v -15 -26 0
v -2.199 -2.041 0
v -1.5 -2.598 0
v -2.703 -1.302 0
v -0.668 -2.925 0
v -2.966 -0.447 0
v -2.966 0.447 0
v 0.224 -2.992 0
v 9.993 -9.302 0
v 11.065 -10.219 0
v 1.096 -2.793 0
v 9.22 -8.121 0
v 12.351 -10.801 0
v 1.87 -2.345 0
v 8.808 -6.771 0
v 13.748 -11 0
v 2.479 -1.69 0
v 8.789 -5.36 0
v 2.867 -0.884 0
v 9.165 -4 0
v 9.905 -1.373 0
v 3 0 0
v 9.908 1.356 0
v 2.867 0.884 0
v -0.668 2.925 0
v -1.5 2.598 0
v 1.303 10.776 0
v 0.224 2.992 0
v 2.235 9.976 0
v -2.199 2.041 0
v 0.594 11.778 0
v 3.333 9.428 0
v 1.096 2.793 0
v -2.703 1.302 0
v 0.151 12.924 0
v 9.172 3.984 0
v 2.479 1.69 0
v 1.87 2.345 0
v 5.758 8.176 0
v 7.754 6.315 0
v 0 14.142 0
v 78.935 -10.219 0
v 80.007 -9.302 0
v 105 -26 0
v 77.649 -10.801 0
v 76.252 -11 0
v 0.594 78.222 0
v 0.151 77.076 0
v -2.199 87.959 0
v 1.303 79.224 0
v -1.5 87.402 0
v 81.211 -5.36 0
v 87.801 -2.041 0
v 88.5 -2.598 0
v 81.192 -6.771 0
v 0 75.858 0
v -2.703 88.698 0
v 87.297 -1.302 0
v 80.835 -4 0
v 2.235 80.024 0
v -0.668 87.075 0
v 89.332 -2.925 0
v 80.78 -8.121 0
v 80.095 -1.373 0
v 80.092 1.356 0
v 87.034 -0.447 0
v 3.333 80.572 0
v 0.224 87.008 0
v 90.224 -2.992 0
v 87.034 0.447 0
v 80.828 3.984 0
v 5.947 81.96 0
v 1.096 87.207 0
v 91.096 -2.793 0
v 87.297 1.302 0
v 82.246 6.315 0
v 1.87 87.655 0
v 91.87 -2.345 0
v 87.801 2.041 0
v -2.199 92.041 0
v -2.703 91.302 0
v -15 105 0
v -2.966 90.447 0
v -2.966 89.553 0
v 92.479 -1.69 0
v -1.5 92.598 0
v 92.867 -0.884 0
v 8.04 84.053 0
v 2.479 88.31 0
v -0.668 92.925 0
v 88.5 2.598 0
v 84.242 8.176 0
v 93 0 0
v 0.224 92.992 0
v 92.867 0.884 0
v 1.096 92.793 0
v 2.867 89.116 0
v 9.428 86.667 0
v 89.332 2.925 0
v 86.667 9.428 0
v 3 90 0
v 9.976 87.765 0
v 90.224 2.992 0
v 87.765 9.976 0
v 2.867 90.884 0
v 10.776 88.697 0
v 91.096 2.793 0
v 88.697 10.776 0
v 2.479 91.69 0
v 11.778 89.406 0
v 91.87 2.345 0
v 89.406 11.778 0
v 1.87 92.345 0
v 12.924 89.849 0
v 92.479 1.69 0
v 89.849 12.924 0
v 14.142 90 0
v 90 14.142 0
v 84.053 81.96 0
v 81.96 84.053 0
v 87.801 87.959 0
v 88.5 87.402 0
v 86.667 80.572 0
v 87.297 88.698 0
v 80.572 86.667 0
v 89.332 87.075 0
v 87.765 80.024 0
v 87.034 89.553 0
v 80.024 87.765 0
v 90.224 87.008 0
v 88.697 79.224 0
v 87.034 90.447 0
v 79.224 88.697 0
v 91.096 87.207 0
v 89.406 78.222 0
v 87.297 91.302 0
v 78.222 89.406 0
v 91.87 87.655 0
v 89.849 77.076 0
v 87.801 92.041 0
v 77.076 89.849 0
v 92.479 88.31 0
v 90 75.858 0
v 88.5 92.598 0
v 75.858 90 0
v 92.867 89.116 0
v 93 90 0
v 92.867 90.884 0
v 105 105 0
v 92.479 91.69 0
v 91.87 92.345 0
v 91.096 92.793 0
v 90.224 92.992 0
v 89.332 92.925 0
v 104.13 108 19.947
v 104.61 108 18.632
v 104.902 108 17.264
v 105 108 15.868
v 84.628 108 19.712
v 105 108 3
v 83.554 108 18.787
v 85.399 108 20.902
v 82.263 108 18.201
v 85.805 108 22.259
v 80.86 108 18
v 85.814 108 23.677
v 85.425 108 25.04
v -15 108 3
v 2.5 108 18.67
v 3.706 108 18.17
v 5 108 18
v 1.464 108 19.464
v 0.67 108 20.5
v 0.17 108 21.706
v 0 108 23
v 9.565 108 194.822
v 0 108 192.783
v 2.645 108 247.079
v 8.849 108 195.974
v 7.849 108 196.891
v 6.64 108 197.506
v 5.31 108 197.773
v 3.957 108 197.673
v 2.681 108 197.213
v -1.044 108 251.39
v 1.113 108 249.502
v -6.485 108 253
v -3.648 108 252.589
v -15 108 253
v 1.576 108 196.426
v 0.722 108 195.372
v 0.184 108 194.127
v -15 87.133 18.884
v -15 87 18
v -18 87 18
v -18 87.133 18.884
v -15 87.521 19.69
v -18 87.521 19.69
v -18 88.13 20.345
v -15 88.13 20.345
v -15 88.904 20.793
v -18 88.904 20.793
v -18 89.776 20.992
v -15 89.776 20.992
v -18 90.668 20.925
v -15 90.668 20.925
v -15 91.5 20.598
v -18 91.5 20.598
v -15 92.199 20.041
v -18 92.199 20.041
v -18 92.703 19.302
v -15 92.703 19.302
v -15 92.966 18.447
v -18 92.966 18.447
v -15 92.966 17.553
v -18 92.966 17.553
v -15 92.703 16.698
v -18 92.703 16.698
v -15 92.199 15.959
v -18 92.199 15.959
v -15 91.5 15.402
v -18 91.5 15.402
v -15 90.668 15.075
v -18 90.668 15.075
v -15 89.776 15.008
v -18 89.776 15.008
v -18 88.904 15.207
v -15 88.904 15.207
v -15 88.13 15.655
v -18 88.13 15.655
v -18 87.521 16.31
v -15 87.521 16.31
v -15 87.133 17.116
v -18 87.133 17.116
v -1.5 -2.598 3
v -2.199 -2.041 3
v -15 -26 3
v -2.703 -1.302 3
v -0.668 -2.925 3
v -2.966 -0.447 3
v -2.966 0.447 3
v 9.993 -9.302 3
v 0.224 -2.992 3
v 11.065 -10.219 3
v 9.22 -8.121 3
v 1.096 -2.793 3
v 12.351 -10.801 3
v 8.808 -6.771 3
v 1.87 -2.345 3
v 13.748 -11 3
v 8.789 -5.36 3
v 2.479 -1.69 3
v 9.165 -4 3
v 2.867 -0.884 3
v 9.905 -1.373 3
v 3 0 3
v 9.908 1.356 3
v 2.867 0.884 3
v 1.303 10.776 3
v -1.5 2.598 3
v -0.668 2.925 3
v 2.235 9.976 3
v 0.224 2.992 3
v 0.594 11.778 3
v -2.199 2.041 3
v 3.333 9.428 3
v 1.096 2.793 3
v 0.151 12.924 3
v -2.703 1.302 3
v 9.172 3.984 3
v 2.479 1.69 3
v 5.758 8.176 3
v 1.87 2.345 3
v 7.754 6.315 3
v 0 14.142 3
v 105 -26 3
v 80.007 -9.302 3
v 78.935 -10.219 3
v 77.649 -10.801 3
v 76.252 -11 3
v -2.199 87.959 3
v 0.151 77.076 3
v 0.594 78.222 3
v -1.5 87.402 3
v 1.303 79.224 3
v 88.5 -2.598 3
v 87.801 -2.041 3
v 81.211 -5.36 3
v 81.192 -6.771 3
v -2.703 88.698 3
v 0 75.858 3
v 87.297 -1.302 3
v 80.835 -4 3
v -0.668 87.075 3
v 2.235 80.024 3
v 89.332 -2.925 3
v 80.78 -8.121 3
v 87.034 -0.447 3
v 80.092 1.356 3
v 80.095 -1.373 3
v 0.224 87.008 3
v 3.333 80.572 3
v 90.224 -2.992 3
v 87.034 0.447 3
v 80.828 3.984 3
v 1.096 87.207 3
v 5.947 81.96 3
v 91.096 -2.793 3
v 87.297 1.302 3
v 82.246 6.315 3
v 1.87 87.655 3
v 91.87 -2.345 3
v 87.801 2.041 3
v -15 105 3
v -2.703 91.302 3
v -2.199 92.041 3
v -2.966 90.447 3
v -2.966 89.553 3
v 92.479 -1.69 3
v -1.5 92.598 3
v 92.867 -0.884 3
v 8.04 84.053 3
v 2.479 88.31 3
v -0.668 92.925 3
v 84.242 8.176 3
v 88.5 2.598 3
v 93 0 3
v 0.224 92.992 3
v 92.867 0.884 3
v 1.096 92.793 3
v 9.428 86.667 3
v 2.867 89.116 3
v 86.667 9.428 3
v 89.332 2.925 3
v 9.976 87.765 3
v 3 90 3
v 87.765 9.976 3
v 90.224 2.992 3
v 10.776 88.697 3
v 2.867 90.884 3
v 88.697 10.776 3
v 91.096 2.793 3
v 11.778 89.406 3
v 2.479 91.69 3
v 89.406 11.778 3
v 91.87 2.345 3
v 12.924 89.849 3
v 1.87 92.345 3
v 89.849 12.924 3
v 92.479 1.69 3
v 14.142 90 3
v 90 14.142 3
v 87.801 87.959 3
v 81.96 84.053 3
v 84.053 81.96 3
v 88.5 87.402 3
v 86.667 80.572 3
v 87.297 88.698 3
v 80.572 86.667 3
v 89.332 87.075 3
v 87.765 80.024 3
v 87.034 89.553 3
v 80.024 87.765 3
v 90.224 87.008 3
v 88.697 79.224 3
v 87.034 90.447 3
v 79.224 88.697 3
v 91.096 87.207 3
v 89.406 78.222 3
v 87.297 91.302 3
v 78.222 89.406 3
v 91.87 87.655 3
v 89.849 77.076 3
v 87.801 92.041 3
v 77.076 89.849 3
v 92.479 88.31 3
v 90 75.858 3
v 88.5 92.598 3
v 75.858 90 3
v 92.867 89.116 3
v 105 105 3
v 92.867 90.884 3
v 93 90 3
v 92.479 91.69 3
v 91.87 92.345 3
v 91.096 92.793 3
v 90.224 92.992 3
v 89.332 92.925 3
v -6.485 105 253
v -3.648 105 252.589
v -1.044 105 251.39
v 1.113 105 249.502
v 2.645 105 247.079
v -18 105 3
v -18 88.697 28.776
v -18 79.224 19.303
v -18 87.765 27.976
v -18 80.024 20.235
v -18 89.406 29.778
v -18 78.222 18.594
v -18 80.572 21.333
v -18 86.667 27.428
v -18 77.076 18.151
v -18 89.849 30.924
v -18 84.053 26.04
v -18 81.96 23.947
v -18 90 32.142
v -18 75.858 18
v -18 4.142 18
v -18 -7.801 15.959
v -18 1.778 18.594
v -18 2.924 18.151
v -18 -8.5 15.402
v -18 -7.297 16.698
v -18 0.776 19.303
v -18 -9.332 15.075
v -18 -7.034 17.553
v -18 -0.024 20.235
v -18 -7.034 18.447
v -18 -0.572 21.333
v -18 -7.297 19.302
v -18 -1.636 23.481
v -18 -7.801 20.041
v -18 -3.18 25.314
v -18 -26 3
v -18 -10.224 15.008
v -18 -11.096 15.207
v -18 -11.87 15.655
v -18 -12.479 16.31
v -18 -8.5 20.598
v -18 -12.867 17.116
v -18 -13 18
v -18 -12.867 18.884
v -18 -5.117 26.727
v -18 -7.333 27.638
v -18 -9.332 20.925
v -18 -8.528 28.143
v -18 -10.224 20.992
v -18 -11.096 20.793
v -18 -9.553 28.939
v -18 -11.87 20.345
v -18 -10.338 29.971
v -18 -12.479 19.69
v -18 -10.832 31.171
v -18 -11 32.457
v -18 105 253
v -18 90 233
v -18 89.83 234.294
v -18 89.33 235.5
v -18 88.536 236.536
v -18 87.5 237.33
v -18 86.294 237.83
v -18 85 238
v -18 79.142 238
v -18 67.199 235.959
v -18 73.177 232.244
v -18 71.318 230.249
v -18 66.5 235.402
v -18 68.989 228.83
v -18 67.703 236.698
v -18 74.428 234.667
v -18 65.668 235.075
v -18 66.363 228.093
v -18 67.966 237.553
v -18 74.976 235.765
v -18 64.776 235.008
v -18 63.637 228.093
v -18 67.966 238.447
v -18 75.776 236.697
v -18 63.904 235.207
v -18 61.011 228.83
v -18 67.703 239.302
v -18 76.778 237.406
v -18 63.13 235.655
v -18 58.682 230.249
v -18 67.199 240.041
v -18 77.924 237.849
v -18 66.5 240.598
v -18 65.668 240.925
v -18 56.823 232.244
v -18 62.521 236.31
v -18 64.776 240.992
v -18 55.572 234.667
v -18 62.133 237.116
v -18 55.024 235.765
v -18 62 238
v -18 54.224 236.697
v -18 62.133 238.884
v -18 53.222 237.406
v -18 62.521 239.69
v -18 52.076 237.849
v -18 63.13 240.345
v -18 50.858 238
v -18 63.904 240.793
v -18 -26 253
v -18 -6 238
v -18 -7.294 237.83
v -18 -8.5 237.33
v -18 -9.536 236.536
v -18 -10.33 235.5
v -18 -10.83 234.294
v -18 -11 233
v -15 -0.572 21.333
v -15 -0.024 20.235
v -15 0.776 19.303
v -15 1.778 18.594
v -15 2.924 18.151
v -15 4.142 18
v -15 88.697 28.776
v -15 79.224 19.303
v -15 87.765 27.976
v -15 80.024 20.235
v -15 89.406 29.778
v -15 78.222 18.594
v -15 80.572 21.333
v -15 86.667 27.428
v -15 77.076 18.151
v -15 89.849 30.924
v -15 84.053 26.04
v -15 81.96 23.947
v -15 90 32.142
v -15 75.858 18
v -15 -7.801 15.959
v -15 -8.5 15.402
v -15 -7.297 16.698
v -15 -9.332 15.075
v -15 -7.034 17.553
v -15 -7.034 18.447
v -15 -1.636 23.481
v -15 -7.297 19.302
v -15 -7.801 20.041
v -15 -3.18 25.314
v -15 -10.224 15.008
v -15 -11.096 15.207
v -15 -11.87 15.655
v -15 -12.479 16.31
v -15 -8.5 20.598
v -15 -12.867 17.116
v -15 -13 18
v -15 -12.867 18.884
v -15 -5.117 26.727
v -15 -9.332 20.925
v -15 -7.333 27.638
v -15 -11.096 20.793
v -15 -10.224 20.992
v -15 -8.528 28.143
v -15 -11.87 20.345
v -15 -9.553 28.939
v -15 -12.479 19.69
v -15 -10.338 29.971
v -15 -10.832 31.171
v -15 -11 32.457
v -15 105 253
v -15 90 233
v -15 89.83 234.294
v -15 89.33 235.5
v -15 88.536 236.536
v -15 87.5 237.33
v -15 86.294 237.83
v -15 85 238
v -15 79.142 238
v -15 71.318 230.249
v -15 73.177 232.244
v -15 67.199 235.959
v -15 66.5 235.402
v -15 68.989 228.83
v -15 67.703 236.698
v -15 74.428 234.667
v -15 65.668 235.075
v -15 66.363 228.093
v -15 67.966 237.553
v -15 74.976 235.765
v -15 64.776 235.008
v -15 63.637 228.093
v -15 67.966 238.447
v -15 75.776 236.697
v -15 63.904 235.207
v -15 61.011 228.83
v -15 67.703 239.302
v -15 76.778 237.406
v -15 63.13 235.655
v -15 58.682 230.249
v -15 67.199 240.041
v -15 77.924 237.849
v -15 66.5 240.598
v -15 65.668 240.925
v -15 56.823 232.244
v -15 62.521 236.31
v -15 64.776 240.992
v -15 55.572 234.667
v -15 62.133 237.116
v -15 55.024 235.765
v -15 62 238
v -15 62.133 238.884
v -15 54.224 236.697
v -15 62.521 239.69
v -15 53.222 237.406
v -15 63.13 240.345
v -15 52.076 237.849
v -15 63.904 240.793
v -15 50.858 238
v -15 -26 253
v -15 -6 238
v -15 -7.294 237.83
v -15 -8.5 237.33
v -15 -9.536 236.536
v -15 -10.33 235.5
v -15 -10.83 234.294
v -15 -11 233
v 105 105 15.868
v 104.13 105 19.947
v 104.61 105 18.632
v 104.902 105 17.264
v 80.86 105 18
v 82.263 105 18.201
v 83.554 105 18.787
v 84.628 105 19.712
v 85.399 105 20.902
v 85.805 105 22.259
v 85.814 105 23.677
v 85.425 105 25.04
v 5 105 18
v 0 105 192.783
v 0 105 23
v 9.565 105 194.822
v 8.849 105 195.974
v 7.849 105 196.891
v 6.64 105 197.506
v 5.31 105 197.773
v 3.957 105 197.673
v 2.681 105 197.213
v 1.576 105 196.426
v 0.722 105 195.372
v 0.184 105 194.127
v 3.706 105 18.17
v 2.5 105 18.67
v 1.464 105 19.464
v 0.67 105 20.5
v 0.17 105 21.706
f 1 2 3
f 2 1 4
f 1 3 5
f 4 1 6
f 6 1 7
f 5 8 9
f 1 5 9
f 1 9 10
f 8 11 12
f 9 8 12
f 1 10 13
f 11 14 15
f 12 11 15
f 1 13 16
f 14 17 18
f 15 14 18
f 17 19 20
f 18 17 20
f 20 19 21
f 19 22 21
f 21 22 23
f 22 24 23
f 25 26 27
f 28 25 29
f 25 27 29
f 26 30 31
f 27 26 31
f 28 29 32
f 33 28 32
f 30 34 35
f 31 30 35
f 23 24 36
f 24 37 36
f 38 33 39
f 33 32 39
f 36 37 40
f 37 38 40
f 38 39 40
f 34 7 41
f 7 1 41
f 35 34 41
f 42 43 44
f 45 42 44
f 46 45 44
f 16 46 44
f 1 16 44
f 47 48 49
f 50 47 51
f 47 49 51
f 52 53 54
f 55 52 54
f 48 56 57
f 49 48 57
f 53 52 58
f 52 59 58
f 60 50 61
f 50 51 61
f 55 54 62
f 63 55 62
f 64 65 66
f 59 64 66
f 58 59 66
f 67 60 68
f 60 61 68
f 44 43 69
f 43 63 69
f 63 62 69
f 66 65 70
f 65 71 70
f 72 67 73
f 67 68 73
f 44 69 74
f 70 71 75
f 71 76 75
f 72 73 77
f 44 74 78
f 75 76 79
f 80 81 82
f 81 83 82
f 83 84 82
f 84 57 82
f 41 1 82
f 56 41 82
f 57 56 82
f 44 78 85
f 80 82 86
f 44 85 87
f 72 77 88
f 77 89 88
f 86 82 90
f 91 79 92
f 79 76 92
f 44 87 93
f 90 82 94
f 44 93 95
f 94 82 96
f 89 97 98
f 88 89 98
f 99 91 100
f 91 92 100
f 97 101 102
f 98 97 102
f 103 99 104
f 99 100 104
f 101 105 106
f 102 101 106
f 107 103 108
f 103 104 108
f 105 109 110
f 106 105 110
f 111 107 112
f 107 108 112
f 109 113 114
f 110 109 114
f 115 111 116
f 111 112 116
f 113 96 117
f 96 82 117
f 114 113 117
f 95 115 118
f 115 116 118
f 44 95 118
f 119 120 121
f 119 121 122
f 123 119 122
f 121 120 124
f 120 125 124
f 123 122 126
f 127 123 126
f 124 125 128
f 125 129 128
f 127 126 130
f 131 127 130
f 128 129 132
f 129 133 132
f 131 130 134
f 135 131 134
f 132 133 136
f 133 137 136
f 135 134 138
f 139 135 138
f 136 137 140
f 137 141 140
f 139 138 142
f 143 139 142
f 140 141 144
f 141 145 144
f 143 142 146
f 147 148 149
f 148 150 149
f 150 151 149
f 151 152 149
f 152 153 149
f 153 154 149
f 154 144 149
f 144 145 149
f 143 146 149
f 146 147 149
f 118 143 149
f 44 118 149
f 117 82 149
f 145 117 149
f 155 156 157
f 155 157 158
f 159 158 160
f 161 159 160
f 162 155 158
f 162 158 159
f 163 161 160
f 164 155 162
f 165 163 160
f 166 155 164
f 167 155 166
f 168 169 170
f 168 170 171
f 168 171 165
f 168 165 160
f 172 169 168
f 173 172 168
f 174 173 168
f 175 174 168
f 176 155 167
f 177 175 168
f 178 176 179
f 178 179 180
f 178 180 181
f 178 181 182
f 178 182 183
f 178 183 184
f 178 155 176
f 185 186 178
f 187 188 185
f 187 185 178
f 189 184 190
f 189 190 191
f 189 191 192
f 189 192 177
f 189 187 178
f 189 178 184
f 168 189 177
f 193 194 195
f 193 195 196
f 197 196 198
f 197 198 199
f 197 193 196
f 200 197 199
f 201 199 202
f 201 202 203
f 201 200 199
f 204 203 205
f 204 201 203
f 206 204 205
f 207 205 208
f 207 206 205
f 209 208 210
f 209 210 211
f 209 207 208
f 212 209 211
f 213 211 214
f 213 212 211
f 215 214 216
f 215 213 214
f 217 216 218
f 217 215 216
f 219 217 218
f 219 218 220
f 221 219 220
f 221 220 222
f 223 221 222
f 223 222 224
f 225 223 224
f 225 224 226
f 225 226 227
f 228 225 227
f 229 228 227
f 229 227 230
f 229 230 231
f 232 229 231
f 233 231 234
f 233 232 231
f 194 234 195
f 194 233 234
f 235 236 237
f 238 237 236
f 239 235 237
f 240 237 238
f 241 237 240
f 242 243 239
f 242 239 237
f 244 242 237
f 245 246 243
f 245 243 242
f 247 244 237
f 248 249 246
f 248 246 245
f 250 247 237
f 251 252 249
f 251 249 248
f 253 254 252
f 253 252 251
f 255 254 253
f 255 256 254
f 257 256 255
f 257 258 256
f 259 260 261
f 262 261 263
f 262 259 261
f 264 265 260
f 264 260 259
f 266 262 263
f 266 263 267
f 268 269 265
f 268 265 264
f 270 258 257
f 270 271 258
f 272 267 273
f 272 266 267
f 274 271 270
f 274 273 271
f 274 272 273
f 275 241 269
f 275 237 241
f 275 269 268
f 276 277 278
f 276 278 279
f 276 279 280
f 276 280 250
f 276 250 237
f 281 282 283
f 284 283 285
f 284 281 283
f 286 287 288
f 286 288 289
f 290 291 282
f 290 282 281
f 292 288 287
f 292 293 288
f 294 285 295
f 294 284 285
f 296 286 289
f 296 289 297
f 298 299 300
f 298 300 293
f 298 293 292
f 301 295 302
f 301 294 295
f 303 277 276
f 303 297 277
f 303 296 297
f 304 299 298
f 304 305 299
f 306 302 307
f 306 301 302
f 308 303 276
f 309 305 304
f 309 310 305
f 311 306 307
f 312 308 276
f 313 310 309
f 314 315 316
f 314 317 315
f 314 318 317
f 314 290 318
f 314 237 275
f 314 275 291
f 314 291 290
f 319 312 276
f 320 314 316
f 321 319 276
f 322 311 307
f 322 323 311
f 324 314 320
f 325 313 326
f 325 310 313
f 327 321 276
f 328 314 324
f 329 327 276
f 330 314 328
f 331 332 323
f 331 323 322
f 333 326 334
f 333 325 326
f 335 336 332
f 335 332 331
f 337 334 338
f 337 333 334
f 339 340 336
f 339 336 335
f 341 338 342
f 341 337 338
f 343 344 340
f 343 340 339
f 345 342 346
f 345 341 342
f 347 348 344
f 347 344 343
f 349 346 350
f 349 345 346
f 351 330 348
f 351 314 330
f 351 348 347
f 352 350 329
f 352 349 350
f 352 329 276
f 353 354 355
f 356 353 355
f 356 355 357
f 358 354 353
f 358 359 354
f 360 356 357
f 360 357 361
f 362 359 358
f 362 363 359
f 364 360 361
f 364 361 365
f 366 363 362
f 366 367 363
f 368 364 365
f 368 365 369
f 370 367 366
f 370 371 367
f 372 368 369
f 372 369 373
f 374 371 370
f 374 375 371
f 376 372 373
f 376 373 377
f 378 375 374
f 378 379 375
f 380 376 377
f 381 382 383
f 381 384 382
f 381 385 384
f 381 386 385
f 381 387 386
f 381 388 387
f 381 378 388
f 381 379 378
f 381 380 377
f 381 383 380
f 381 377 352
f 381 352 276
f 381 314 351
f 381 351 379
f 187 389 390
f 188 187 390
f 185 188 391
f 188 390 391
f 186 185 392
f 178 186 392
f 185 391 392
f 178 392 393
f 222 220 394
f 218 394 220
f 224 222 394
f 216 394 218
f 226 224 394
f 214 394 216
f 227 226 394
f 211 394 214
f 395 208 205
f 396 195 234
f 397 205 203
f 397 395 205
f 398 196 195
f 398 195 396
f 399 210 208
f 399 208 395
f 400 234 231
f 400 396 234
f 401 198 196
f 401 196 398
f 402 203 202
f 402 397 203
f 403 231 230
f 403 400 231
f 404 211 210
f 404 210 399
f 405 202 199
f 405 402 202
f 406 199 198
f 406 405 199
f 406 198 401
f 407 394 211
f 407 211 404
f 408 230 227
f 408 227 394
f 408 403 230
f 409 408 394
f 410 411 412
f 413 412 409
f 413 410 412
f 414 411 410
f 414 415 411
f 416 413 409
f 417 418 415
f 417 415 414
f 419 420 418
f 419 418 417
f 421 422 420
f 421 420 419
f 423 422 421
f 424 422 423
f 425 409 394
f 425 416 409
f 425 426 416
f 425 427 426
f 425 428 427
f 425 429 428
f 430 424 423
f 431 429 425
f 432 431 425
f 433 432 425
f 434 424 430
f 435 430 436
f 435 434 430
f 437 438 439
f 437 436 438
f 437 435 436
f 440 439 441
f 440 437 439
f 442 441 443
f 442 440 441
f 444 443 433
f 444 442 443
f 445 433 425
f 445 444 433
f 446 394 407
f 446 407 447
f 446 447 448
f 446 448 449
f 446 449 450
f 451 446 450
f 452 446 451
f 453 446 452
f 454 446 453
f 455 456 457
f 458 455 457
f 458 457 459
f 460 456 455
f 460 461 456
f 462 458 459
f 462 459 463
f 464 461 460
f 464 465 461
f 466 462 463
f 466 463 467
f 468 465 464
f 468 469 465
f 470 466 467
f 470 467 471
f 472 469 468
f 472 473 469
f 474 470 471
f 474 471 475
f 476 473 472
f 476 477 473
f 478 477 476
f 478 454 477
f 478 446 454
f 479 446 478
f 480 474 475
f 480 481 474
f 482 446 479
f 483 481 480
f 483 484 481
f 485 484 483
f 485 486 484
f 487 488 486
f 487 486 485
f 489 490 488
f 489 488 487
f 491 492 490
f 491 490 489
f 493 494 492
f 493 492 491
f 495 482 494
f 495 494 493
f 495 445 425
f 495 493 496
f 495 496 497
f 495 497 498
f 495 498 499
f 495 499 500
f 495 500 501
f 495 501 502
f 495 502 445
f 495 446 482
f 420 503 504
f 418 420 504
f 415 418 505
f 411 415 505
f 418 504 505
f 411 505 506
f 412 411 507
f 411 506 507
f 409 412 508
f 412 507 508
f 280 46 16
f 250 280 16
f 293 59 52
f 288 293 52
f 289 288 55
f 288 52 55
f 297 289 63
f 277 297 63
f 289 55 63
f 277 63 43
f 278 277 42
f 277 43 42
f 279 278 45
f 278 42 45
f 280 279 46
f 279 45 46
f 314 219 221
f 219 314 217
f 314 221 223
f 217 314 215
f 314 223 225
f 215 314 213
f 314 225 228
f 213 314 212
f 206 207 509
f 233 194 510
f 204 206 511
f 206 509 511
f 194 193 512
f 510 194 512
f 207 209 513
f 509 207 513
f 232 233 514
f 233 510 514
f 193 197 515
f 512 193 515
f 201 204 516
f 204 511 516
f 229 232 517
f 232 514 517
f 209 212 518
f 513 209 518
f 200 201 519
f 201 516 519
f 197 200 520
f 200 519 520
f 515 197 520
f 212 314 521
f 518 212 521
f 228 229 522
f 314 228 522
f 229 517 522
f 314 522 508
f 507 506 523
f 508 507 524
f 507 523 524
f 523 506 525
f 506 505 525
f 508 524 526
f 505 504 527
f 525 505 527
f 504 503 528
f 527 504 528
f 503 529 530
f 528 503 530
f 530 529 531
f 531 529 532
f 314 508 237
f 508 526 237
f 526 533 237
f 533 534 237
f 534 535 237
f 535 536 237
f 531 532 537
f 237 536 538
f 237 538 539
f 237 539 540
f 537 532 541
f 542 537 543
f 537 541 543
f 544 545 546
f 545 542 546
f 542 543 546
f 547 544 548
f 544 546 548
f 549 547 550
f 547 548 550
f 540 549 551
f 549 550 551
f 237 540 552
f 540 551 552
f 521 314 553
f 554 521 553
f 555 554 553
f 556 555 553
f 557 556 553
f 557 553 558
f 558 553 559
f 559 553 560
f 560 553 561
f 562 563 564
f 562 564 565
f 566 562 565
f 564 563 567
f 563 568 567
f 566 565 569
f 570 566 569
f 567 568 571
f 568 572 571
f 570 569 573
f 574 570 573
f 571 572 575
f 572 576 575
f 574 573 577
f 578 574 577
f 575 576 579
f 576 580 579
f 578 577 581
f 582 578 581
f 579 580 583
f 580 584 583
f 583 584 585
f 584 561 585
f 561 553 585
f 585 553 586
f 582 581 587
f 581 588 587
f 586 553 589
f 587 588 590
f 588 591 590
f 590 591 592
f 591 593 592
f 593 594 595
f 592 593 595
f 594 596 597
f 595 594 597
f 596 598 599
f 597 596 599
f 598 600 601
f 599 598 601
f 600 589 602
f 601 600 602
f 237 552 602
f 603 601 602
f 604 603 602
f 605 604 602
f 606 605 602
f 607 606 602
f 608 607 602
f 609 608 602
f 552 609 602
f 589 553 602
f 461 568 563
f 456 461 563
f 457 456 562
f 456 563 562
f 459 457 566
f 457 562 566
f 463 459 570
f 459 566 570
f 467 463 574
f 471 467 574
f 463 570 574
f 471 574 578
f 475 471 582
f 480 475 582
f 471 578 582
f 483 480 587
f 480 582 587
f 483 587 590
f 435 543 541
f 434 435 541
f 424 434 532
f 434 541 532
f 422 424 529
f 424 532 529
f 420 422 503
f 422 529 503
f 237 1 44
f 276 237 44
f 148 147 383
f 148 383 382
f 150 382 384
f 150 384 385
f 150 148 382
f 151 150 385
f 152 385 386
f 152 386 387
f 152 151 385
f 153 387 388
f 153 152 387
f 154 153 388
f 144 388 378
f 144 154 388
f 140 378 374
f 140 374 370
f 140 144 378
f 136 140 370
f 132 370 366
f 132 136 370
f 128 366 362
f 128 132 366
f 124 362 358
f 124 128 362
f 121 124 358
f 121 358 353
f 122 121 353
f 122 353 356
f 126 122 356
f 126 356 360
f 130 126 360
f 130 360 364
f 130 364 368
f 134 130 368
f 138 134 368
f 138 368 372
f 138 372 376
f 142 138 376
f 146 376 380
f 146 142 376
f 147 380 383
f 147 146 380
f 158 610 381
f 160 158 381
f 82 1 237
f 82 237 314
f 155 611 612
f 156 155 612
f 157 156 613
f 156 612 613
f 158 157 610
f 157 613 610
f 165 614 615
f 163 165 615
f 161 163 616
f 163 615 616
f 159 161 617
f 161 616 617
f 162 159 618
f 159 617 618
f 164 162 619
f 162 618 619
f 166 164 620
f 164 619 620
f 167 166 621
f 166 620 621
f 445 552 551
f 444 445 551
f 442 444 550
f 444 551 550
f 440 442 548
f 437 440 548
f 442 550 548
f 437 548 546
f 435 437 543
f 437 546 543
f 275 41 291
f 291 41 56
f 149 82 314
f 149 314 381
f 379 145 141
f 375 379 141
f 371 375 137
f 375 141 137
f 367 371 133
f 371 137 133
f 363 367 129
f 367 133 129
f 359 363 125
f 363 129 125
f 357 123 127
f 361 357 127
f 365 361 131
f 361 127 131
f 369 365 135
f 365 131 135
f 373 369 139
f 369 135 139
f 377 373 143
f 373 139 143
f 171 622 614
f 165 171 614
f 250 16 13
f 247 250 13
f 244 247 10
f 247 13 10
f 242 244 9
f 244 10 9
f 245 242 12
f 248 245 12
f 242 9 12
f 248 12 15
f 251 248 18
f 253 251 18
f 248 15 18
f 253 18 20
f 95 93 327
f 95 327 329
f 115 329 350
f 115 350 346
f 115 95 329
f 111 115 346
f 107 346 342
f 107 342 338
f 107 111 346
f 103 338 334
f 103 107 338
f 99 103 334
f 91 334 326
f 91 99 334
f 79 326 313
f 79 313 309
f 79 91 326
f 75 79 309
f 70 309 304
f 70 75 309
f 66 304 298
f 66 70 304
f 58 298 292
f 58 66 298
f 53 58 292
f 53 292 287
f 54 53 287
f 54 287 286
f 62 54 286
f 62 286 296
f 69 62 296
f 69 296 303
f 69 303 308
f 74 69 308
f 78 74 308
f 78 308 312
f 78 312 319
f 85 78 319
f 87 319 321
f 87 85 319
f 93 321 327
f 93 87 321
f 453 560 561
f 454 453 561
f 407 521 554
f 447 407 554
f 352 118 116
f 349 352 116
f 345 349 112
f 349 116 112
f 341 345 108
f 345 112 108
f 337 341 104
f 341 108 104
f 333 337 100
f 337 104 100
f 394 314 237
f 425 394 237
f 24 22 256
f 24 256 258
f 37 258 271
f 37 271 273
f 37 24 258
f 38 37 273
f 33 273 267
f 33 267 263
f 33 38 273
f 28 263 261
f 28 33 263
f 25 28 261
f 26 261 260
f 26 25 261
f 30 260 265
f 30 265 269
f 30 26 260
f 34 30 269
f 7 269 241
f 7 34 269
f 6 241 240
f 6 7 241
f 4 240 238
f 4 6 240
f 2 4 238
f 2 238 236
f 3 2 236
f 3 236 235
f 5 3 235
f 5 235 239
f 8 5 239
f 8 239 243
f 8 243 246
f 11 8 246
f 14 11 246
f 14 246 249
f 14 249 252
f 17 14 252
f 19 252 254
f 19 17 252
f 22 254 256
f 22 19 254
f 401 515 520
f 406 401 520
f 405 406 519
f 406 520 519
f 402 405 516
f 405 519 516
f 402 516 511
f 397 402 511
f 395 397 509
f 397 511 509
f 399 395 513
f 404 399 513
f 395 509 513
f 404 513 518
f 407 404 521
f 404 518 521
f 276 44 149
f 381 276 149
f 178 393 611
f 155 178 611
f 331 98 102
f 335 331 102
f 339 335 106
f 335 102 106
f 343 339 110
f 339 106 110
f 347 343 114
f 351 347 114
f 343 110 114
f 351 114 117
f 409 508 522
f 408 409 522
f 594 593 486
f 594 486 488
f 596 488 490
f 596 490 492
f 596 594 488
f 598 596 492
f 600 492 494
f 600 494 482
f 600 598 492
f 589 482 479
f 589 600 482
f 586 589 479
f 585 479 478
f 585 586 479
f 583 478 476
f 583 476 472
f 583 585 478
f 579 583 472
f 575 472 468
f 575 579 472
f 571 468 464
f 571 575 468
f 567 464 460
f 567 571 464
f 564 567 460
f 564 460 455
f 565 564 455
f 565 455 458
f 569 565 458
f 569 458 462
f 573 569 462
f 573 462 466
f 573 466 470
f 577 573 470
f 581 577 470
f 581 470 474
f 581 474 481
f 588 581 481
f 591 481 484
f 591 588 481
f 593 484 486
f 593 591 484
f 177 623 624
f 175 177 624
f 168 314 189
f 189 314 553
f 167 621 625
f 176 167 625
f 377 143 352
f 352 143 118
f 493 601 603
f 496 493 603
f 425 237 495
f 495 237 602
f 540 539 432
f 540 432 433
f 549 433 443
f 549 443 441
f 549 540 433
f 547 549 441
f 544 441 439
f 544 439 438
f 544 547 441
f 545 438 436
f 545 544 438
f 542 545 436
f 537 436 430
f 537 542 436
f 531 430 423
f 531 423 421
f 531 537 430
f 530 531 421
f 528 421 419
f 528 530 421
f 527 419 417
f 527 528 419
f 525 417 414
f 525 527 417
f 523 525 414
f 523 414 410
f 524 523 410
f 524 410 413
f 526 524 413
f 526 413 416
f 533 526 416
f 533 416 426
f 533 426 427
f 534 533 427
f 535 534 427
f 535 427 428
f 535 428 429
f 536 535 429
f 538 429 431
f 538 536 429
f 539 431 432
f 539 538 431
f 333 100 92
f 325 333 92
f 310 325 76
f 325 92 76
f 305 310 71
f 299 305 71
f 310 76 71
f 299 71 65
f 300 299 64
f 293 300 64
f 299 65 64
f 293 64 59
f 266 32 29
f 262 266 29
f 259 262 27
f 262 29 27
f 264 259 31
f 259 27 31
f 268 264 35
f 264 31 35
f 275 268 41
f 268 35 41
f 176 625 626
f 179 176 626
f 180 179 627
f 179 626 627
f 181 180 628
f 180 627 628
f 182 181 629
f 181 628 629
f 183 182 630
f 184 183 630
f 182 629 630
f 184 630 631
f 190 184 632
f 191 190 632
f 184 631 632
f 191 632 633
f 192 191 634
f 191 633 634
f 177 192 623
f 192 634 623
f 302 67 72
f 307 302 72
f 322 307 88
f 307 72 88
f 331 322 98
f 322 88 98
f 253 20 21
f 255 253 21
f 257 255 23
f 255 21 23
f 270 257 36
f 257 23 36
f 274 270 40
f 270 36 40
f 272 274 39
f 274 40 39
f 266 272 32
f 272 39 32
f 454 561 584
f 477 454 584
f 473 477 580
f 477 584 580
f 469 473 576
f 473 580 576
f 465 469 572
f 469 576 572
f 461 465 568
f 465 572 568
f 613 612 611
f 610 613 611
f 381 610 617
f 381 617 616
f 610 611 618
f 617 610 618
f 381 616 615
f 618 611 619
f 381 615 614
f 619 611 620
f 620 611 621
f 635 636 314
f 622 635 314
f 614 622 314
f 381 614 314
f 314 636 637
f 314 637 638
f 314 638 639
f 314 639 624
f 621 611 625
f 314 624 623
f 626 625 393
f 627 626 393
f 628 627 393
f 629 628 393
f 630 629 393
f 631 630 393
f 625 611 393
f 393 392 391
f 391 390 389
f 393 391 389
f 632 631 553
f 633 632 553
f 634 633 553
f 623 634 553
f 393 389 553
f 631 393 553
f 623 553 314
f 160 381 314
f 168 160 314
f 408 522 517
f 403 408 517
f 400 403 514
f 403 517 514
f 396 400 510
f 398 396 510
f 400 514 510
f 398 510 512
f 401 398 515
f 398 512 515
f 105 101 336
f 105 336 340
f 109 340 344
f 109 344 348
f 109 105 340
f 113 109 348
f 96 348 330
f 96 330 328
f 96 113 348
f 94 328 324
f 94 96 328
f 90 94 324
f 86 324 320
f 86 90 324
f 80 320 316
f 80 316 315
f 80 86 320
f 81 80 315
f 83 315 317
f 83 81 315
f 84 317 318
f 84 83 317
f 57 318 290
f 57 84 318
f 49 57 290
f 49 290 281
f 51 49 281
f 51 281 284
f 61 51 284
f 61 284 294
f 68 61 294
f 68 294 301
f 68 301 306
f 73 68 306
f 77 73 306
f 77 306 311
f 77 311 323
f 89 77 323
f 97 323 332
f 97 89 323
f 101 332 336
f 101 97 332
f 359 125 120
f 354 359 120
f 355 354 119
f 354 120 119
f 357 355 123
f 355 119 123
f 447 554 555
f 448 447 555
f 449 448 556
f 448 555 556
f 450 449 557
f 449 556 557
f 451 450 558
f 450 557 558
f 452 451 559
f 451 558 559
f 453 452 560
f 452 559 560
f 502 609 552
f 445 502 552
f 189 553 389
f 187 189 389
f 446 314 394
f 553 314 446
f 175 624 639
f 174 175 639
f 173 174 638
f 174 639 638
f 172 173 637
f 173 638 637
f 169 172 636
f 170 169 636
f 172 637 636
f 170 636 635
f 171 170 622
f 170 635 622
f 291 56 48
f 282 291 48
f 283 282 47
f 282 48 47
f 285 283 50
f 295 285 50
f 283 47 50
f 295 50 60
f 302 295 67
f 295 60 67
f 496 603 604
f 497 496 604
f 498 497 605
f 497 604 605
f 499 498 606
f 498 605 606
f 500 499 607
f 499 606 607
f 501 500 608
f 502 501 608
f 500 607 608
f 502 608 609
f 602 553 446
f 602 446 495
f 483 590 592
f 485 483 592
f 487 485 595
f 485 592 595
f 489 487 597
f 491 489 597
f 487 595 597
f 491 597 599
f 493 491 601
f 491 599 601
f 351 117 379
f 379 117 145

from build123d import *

# Parameters (mm, degrees)
F0_W     = 120
F0_H     = 131
F0_R     = 3
F1_DEPTH = 3
F2_W     = 131
F2_H     = 250
F2_R     = 3
F3_DEPTH = 3
F5_DEPTH = 3


with BuildPart() as f1:
    # F0 (on Top) → F1 (new body)
    with BuildSketch(Plane.XY):
        with Locations((45, 39.5)):
            Rectangle(F0_W, F0_H)
        Circle(F0_R, mode=Mode.SUBTRACT)
        with Locations((90, 0)):
            Circle(F0_R, mode=Mode.SUBTRACT)
        with BuildLine():
            ThreePointArc((0, 75.857864), (0.917517, 78.744616), (3.333333, 80.57191))
            ThreePointArc((3.333333, 80.57191), (7.071068, 82.928932), (9.42809, 86.666667))
            ThreePointArc((9.42809, 86.666667), (11.255384, 89.082483), (14.142136, 90))
            Line((14.142136, 90), (75.857864, 90))
            ThreePointArc((75.857864, 90), (78.744616, 89.082483), (80.57191, 86.666667))
            ThreePointArc((80.57191, 86.666667), (82.928932, 82.928932), (86.666667, 80.57191))
            ThreePointArc((86.666667, 80.57191), (89.082483, 78.744616), (90, 75.857864))
            Line((90, 75.857864), (90, 14.142136))
            ThreePointArc((90, 14.142136), (89.082483, 11.255384), (86.666667, 9.42809))
            ThreePointArc((86.666667, 9.42809), (80.827681, 3.983537), (80.834849, -4))
            ThreePointArc((80.834849, -4), (80.435573, -8.738613), (76.252273, -11))
            Line((76.252273, -11), (13.747727, -11))
            ThreePointArc((13.747727, -11), (9.564427, -8.738613), (9.165151, -4))
            ThreePointArc((9.165151, -4), (9.172319, 3.983537), (3.333333, 9.42809))
            ThreePointArc((3.333333, 9.42809), (0.917517, 11.255384), (0, 14.142136))
            Line((0, 14.142136), (0, 75.857864))
        make_face(mode=Mode.SUBTRACT)
        with Locations((0, 90)):
            Circle(F0_R, mode=Mode.SUBTRACT)
        with Locations((90, 90)):
            Circle(F0_R, mode=Mode.SUBTRACT)
    extrude(amount=F1_DEPTH)


with BuildPart() as f3:
    # F2 (on face) → F3 (new body)
    with BuildSketch(Plane(origin=(-15, 0, 0), x_dir=(0, -1, 0), z_dir=(-1, 0, 0))):
        with Locations((-39.5, 128)):
            Rectangle(F2_W, F2_H)
        with Locations((-90, 18)):
            Circle(F2_R, mode=Mode.SUBTRACT)
        with Locations((10, 18)):
            Circle(F2_R, mode=Mode.SUBTRACT)
        with Locations((-65, 238)):
            Circle(F2_R, mode=Mode.SUBTRACT)
        with BuildLine():
            ThreePointArc((-79.142136, 238), (-76.255384, 237.082483), (-74.42809, 234.666667))
            ThreePointArc((-74.42809, 234.666667), (-65, 228), (-55.57191, 234.666667))
            ThreePointArc((-55.57191, 234.666667), (-53.744616, 237.082483), (-50.857864, 238))
            Line((-50.857864, 238), (6, 238))
            ThreePointArc((6, 238), (9.535534, 236.535534), (11, 233))
            Line((11, 233), (11, 32.456832))
            ThreePointArc((11, 32.456832), (9.979112, 29.429182), (7.333333, 27.637888))
            ThreePointArc((7.333333, 27.637888), (3.180349, 25.313847), (0.57191, 21.333333))
            ThreePointArc((0.57191, 21.333333), (-1.255384, 18.917517), (-4.142136, 18))
            Line((-4.142136, 18), (-75.857864, 18))
            ThreePointArc((-75.857864, 18), (-78.744616, 18.917517), (-80.57191, 21.333333))
            ThreePointArc((-80.57191, 21.333333), (-82.928932, 25.071068), (-86.666667, 27.42809))
            ThreePointArc((-86.666667, 27.42809), (-89.082483, 29.255384), (-90, 32.142136))
            Line((-90, 32.142136), (-90, 233))
            ThreePointArc((-90, 233), (-88.535534, 236.535534), (-85, 238))
            Line((-85, 238), (-79.142136, 238))
        make_face(mode=Mode.SUBTRACT)
    extrude(amount=F3_DEPTH)


with BuildPart() as f5:
    # F4 (on face) → F5 (new body)
    with BuildSketch(Plane(origin=(0, 105, 0), x_dir=(-1, 0, 0), z_dir=(0, 1, 0))):
        with BuildLine():
            Line((-105, 3), (15, 3))
            Line((15, 3), (15, 253))
            Line((15, 253), (6.484713, 253))
            ThreePointArc((6.484713, 253), (1.043849, 251.390292), (-2.645374, 247.079401))
            Line((-2.645374, 247.079401), (-104.130087, 19.946948))
            ThreePointArc((-104.130087, 19.946948), (-104.780104, 17.953108), (-105, 15.867547))
            Line((-105, 15.867547), (-105, 3))
        make_face()
        with BuildLine():
            ThreePointArc((-9.565044, 194.822414), (-3.95722, 197.672766), (0, 192.782714))
            Line((0, 192.782714), (0, 23))
            ThreePointArc((0, 23), (-1.464466, 19.464466), (-5, 18))
            Line((-5, 18), (-80.860361, 18))
            ThreePointArc((-80.860361, 18), (-85.055507, 20.279568), (-85.425405, 25.0397))
            Line((-85.425405, 25.0397), (-9.565044, 194.822414))
        make_face(mode=Mode.SUBTRACT)
    extrude(amount=F5_DEPTH)


solid = Compound([f1.part, f3.part, f5.part])
